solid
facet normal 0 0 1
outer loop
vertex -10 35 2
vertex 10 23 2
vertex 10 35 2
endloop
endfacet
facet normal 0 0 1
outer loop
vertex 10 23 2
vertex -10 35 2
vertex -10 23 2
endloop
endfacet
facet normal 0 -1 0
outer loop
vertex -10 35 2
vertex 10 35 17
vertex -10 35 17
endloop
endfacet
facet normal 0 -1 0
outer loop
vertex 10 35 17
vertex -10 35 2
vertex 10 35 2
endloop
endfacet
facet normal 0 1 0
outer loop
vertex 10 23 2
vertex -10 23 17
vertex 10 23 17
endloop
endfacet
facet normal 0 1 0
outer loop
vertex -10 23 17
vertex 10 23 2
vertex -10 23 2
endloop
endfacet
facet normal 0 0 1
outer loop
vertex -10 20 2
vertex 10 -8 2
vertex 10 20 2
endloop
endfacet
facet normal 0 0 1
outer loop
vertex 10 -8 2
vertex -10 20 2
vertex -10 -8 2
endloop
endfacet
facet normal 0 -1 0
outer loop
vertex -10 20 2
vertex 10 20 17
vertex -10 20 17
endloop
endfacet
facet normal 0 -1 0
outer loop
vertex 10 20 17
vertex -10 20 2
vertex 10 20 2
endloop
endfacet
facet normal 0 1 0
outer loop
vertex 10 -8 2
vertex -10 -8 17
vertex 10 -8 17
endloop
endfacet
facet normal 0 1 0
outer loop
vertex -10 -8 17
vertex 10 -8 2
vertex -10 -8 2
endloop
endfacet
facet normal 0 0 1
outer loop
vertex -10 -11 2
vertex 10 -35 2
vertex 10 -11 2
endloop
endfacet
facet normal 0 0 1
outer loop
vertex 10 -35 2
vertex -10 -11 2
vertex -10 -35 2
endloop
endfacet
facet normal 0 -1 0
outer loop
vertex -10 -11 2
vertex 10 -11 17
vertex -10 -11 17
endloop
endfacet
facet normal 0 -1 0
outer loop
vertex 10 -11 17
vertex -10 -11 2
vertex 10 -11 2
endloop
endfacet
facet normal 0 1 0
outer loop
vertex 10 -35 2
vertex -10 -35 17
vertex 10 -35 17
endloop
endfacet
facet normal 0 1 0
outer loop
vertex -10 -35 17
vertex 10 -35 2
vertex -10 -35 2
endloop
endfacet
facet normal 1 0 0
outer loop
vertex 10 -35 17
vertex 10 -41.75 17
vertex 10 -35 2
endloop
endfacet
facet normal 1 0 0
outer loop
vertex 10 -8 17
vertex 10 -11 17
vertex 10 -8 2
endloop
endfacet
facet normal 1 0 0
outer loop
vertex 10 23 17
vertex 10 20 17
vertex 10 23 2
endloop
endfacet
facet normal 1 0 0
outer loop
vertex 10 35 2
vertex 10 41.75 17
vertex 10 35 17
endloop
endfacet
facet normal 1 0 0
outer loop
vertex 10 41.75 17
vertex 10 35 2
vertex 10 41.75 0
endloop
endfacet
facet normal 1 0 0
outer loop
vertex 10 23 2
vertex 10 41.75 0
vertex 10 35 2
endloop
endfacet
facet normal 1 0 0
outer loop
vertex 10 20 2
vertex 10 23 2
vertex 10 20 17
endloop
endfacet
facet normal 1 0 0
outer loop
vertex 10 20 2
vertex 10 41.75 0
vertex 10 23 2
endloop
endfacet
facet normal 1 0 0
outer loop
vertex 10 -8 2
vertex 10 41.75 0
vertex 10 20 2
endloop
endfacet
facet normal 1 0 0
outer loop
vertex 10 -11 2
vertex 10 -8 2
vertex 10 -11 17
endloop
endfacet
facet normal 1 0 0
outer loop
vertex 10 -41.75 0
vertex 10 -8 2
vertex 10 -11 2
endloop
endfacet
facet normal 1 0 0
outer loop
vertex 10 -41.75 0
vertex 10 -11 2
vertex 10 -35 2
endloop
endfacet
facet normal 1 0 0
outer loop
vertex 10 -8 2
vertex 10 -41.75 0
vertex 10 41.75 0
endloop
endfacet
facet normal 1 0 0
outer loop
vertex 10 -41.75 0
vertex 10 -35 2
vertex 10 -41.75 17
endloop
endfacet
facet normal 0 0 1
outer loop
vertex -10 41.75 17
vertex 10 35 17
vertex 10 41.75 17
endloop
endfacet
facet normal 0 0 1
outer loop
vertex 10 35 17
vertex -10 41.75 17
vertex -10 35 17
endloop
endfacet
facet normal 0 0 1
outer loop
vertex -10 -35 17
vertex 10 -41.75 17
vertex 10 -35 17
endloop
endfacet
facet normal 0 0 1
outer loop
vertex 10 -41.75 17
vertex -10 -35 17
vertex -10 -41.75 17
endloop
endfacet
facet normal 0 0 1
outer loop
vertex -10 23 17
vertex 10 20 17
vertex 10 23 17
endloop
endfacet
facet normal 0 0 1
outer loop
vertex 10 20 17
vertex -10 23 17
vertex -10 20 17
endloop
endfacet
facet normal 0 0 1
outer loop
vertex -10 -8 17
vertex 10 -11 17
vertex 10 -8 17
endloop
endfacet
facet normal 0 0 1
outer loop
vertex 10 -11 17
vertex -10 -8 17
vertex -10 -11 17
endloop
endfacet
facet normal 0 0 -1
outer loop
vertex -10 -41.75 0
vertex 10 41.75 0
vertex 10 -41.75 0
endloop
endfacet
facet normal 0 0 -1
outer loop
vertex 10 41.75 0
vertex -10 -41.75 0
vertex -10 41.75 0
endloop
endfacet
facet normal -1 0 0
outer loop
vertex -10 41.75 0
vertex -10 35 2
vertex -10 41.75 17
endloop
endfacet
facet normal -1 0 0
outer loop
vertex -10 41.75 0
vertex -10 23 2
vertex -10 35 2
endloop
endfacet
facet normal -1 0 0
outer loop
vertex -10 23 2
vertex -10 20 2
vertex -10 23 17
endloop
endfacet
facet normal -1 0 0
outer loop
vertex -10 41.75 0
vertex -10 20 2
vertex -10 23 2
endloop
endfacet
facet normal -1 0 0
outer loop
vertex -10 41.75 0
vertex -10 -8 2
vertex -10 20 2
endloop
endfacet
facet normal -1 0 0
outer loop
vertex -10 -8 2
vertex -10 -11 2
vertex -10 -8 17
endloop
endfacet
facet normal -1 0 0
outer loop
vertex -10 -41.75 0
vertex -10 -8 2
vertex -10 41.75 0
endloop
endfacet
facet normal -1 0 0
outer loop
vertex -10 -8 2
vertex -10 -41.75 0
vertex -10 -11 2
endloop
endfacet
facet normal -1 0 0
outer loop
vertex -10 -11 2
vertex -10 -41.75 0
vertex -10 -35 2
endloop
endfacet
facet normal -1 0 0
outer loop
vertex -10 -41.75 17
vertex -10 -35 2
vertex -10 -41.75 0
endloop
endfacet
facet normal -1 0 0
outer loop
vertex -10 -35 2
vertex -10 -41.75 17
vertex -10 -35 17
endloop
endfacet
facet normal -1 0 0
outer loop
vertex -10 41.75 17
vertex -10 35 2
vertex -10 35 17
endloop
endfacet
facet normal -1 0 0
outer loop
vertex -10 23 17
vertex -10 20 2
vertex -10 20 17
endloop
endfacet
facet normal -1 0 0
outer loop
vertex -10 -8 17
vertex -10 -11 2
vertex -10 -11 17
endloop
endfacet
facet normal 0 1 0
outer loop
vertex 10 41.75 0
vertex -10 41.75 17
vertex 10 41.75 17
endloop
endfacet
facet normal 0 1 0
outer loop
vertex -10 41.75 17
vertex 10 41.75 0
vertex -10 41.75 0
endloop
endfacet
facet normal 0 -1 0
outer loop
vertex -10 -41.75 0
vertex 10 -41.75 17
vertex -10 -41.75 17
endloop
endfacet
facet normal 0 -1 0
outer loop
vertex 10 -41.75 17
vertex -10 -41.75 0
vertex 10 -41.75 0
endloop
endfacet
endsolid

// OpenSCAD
// file: ../fixture_rack_common.scad
// fixture_rack_common — 5×2 Gridfinity storage rack for three repair fixtures, standing
// on edge like books. Storage, not use: the user's own sketch (2026-10-25).
//
// MEASURED BY THE USER (survey/MEASUREMENTS.md, 2026-10-25):
//   AMAOE M81 heat mat   190 × 245 × 8    on its 190 edge, 245 tall
//   RELIFE RL-605 Pro    179 × 210 × 24   on its 210 edge, 179 tall; knobs on both
//                                         ends about halfway up
//   RELIFE TF5           60 × 182 × 20    on its 182 edge (knobs included), 60 tall
//
// THE RL-605's SLOT HAS NO END WALLS. Five cells is 209.5 outside but ~207 inside
// the end walls, and the RL-605 is 210 long — so its slot runs straight out both
// ends, the plate sits across the whole length, and its knobs hang over the ends
// well above the rim (user's call). The other two fit inside walled slots.
//
// STEPPED, AS SKETCHED: the back section (mat, RL-605) stands BACK_H; the front
// section (TF5) steps down to FRONT_H so a hand gets in.
//
// PRINT: as emitted, feet down. No supports.
//
// SPDX-License-Identifier: CC-BY-NC-4.0
// Copyright (c) 2026 Aaron Cupp

include <../lib/gridfinity.scad>

/* [Pieces — measured] */
// [name, standing length (on the floor), thickness]
MAT = [190, 8];
RL  = [210, 24];
TF5 = [182, 20];

/* [Rack] */
NX = 5; NY = 2;
CLR      = 4;      // added to each thickness — slots this much wider than the piece
WALL     = 2.4;    // outer walls
DIV      = 3.0;    // dividers — the RL-605 is the heavy one and leans on them
FLOOR    = 2.0;
BACK_H   = 60;     // above the floor: mat + RL-605, a third of the RL-605's 179
FRONT_H  = 30;     // TF5 section: half its 60 mm height

W = NX*GF - 0.5;  D = NY*GF - 0.5;
Z0 = BIN_BASE_H + FLOOR;
IN_X = W - 2*WALL;                       // inside the end walls

slots = [MAT[1] + CLR, RL[1] + CLR, TF5[1] + CLR];   // back → front
used  = slots[0] + slots[1] + slots[2] + 2*DIV;
y_back = D/2 - (D - used)/2;            // centre the group; outer walls take the rest
// back edge of each slot, going toward the front (−Y)
function y_top(i) = y_back - (i == 0 ? 0 : i == 1 ? slots[0] + DIV : slots[0] + slots[1] + 2*DIV);
step_y = y_top(2) + DIV/2;              // the step sits over the RL/TF5 divider's middle

assert(MAT[0] <= IN_X && TF5[0] <= IN_X, "Mat or TF5 longer than the walled slot.");
assert(RL[0] > IN_X, "RL-605 now fits inside end walls — give its slot end walls back.");
assert((D - used)/2 >= WALL, "Slots don't fit across two cells.");
echo(str("rack ", W, " × ", D, "; slots (back→front) ", slots, "; outer walls ", (D - used)/2,
         "; back ", Z0 + BACK_H, " tall, front ", Z0 + FRONT_H));

module slot(i, open_ends) {
    l = open_ends ? W + 2 : IN_X;
    translate([-l/2, y_top(i) - slots[i], Z0]) cube([l, slots[i], BACK_H + 1]);
}

module rack() {
    difference() {
        bin_blank(NX, NY, Z0 + BACK_H);
        slot(0, false);   // heat mat
        slot(1, true);    // RL-605: open both ends
        slot(2, false);   // TF5
        // the step: everything in front of it comes down to FRONT_H
        translate([-W, -D, Z0 + FRONT_H]) cube([2*W, step_y + D, BACK_H]);
    }
}

// A 20 mm slice through all three slots, flat-bottomed, walls COUPON_H tall: the
// same slot widths and dividers as the rack, for a few grams.
COUPON_L = 20;
COUPON_H = 15;
module coupon() {
    difference() {
        translate([-COUPON_L/2, -D/2, 0]) cube([COUPON_L, D, FLOOR + COUPON_H]);
        for (i = [0:2])
            translate([-COUPON_L, y_top(i) - slots[i], FLOOR]) cube([2*COUPON_L, slots[i], COUPON_H + 1]);
    }
}
// main file
// slot_fit_coupon — print first. A 20 mm slice through the fixture rack's three
// slots, at the rack's exact widths and divider thicknesses, flat-bottomed.
//
// Stand each fixture's edge in its slot. Back to front (the wide end of the
// coupon is the back): heat mat (thin), RL-605 (widest), TF5. Want: each drops in
// by hand with a little side play and no forcing. Too tight or too sloppy →
// change CLR in fixture_rack_common.scad and the rack follows.
//
// PRINT: flat as emitted, no supports. ~12 g.
//
// SPDX-License-Identifier: CC-BY-NC-4.0
// Copyright (c) 2026 Aaron Cupp
include <../fixture_rack_common.scad>
coupon();
